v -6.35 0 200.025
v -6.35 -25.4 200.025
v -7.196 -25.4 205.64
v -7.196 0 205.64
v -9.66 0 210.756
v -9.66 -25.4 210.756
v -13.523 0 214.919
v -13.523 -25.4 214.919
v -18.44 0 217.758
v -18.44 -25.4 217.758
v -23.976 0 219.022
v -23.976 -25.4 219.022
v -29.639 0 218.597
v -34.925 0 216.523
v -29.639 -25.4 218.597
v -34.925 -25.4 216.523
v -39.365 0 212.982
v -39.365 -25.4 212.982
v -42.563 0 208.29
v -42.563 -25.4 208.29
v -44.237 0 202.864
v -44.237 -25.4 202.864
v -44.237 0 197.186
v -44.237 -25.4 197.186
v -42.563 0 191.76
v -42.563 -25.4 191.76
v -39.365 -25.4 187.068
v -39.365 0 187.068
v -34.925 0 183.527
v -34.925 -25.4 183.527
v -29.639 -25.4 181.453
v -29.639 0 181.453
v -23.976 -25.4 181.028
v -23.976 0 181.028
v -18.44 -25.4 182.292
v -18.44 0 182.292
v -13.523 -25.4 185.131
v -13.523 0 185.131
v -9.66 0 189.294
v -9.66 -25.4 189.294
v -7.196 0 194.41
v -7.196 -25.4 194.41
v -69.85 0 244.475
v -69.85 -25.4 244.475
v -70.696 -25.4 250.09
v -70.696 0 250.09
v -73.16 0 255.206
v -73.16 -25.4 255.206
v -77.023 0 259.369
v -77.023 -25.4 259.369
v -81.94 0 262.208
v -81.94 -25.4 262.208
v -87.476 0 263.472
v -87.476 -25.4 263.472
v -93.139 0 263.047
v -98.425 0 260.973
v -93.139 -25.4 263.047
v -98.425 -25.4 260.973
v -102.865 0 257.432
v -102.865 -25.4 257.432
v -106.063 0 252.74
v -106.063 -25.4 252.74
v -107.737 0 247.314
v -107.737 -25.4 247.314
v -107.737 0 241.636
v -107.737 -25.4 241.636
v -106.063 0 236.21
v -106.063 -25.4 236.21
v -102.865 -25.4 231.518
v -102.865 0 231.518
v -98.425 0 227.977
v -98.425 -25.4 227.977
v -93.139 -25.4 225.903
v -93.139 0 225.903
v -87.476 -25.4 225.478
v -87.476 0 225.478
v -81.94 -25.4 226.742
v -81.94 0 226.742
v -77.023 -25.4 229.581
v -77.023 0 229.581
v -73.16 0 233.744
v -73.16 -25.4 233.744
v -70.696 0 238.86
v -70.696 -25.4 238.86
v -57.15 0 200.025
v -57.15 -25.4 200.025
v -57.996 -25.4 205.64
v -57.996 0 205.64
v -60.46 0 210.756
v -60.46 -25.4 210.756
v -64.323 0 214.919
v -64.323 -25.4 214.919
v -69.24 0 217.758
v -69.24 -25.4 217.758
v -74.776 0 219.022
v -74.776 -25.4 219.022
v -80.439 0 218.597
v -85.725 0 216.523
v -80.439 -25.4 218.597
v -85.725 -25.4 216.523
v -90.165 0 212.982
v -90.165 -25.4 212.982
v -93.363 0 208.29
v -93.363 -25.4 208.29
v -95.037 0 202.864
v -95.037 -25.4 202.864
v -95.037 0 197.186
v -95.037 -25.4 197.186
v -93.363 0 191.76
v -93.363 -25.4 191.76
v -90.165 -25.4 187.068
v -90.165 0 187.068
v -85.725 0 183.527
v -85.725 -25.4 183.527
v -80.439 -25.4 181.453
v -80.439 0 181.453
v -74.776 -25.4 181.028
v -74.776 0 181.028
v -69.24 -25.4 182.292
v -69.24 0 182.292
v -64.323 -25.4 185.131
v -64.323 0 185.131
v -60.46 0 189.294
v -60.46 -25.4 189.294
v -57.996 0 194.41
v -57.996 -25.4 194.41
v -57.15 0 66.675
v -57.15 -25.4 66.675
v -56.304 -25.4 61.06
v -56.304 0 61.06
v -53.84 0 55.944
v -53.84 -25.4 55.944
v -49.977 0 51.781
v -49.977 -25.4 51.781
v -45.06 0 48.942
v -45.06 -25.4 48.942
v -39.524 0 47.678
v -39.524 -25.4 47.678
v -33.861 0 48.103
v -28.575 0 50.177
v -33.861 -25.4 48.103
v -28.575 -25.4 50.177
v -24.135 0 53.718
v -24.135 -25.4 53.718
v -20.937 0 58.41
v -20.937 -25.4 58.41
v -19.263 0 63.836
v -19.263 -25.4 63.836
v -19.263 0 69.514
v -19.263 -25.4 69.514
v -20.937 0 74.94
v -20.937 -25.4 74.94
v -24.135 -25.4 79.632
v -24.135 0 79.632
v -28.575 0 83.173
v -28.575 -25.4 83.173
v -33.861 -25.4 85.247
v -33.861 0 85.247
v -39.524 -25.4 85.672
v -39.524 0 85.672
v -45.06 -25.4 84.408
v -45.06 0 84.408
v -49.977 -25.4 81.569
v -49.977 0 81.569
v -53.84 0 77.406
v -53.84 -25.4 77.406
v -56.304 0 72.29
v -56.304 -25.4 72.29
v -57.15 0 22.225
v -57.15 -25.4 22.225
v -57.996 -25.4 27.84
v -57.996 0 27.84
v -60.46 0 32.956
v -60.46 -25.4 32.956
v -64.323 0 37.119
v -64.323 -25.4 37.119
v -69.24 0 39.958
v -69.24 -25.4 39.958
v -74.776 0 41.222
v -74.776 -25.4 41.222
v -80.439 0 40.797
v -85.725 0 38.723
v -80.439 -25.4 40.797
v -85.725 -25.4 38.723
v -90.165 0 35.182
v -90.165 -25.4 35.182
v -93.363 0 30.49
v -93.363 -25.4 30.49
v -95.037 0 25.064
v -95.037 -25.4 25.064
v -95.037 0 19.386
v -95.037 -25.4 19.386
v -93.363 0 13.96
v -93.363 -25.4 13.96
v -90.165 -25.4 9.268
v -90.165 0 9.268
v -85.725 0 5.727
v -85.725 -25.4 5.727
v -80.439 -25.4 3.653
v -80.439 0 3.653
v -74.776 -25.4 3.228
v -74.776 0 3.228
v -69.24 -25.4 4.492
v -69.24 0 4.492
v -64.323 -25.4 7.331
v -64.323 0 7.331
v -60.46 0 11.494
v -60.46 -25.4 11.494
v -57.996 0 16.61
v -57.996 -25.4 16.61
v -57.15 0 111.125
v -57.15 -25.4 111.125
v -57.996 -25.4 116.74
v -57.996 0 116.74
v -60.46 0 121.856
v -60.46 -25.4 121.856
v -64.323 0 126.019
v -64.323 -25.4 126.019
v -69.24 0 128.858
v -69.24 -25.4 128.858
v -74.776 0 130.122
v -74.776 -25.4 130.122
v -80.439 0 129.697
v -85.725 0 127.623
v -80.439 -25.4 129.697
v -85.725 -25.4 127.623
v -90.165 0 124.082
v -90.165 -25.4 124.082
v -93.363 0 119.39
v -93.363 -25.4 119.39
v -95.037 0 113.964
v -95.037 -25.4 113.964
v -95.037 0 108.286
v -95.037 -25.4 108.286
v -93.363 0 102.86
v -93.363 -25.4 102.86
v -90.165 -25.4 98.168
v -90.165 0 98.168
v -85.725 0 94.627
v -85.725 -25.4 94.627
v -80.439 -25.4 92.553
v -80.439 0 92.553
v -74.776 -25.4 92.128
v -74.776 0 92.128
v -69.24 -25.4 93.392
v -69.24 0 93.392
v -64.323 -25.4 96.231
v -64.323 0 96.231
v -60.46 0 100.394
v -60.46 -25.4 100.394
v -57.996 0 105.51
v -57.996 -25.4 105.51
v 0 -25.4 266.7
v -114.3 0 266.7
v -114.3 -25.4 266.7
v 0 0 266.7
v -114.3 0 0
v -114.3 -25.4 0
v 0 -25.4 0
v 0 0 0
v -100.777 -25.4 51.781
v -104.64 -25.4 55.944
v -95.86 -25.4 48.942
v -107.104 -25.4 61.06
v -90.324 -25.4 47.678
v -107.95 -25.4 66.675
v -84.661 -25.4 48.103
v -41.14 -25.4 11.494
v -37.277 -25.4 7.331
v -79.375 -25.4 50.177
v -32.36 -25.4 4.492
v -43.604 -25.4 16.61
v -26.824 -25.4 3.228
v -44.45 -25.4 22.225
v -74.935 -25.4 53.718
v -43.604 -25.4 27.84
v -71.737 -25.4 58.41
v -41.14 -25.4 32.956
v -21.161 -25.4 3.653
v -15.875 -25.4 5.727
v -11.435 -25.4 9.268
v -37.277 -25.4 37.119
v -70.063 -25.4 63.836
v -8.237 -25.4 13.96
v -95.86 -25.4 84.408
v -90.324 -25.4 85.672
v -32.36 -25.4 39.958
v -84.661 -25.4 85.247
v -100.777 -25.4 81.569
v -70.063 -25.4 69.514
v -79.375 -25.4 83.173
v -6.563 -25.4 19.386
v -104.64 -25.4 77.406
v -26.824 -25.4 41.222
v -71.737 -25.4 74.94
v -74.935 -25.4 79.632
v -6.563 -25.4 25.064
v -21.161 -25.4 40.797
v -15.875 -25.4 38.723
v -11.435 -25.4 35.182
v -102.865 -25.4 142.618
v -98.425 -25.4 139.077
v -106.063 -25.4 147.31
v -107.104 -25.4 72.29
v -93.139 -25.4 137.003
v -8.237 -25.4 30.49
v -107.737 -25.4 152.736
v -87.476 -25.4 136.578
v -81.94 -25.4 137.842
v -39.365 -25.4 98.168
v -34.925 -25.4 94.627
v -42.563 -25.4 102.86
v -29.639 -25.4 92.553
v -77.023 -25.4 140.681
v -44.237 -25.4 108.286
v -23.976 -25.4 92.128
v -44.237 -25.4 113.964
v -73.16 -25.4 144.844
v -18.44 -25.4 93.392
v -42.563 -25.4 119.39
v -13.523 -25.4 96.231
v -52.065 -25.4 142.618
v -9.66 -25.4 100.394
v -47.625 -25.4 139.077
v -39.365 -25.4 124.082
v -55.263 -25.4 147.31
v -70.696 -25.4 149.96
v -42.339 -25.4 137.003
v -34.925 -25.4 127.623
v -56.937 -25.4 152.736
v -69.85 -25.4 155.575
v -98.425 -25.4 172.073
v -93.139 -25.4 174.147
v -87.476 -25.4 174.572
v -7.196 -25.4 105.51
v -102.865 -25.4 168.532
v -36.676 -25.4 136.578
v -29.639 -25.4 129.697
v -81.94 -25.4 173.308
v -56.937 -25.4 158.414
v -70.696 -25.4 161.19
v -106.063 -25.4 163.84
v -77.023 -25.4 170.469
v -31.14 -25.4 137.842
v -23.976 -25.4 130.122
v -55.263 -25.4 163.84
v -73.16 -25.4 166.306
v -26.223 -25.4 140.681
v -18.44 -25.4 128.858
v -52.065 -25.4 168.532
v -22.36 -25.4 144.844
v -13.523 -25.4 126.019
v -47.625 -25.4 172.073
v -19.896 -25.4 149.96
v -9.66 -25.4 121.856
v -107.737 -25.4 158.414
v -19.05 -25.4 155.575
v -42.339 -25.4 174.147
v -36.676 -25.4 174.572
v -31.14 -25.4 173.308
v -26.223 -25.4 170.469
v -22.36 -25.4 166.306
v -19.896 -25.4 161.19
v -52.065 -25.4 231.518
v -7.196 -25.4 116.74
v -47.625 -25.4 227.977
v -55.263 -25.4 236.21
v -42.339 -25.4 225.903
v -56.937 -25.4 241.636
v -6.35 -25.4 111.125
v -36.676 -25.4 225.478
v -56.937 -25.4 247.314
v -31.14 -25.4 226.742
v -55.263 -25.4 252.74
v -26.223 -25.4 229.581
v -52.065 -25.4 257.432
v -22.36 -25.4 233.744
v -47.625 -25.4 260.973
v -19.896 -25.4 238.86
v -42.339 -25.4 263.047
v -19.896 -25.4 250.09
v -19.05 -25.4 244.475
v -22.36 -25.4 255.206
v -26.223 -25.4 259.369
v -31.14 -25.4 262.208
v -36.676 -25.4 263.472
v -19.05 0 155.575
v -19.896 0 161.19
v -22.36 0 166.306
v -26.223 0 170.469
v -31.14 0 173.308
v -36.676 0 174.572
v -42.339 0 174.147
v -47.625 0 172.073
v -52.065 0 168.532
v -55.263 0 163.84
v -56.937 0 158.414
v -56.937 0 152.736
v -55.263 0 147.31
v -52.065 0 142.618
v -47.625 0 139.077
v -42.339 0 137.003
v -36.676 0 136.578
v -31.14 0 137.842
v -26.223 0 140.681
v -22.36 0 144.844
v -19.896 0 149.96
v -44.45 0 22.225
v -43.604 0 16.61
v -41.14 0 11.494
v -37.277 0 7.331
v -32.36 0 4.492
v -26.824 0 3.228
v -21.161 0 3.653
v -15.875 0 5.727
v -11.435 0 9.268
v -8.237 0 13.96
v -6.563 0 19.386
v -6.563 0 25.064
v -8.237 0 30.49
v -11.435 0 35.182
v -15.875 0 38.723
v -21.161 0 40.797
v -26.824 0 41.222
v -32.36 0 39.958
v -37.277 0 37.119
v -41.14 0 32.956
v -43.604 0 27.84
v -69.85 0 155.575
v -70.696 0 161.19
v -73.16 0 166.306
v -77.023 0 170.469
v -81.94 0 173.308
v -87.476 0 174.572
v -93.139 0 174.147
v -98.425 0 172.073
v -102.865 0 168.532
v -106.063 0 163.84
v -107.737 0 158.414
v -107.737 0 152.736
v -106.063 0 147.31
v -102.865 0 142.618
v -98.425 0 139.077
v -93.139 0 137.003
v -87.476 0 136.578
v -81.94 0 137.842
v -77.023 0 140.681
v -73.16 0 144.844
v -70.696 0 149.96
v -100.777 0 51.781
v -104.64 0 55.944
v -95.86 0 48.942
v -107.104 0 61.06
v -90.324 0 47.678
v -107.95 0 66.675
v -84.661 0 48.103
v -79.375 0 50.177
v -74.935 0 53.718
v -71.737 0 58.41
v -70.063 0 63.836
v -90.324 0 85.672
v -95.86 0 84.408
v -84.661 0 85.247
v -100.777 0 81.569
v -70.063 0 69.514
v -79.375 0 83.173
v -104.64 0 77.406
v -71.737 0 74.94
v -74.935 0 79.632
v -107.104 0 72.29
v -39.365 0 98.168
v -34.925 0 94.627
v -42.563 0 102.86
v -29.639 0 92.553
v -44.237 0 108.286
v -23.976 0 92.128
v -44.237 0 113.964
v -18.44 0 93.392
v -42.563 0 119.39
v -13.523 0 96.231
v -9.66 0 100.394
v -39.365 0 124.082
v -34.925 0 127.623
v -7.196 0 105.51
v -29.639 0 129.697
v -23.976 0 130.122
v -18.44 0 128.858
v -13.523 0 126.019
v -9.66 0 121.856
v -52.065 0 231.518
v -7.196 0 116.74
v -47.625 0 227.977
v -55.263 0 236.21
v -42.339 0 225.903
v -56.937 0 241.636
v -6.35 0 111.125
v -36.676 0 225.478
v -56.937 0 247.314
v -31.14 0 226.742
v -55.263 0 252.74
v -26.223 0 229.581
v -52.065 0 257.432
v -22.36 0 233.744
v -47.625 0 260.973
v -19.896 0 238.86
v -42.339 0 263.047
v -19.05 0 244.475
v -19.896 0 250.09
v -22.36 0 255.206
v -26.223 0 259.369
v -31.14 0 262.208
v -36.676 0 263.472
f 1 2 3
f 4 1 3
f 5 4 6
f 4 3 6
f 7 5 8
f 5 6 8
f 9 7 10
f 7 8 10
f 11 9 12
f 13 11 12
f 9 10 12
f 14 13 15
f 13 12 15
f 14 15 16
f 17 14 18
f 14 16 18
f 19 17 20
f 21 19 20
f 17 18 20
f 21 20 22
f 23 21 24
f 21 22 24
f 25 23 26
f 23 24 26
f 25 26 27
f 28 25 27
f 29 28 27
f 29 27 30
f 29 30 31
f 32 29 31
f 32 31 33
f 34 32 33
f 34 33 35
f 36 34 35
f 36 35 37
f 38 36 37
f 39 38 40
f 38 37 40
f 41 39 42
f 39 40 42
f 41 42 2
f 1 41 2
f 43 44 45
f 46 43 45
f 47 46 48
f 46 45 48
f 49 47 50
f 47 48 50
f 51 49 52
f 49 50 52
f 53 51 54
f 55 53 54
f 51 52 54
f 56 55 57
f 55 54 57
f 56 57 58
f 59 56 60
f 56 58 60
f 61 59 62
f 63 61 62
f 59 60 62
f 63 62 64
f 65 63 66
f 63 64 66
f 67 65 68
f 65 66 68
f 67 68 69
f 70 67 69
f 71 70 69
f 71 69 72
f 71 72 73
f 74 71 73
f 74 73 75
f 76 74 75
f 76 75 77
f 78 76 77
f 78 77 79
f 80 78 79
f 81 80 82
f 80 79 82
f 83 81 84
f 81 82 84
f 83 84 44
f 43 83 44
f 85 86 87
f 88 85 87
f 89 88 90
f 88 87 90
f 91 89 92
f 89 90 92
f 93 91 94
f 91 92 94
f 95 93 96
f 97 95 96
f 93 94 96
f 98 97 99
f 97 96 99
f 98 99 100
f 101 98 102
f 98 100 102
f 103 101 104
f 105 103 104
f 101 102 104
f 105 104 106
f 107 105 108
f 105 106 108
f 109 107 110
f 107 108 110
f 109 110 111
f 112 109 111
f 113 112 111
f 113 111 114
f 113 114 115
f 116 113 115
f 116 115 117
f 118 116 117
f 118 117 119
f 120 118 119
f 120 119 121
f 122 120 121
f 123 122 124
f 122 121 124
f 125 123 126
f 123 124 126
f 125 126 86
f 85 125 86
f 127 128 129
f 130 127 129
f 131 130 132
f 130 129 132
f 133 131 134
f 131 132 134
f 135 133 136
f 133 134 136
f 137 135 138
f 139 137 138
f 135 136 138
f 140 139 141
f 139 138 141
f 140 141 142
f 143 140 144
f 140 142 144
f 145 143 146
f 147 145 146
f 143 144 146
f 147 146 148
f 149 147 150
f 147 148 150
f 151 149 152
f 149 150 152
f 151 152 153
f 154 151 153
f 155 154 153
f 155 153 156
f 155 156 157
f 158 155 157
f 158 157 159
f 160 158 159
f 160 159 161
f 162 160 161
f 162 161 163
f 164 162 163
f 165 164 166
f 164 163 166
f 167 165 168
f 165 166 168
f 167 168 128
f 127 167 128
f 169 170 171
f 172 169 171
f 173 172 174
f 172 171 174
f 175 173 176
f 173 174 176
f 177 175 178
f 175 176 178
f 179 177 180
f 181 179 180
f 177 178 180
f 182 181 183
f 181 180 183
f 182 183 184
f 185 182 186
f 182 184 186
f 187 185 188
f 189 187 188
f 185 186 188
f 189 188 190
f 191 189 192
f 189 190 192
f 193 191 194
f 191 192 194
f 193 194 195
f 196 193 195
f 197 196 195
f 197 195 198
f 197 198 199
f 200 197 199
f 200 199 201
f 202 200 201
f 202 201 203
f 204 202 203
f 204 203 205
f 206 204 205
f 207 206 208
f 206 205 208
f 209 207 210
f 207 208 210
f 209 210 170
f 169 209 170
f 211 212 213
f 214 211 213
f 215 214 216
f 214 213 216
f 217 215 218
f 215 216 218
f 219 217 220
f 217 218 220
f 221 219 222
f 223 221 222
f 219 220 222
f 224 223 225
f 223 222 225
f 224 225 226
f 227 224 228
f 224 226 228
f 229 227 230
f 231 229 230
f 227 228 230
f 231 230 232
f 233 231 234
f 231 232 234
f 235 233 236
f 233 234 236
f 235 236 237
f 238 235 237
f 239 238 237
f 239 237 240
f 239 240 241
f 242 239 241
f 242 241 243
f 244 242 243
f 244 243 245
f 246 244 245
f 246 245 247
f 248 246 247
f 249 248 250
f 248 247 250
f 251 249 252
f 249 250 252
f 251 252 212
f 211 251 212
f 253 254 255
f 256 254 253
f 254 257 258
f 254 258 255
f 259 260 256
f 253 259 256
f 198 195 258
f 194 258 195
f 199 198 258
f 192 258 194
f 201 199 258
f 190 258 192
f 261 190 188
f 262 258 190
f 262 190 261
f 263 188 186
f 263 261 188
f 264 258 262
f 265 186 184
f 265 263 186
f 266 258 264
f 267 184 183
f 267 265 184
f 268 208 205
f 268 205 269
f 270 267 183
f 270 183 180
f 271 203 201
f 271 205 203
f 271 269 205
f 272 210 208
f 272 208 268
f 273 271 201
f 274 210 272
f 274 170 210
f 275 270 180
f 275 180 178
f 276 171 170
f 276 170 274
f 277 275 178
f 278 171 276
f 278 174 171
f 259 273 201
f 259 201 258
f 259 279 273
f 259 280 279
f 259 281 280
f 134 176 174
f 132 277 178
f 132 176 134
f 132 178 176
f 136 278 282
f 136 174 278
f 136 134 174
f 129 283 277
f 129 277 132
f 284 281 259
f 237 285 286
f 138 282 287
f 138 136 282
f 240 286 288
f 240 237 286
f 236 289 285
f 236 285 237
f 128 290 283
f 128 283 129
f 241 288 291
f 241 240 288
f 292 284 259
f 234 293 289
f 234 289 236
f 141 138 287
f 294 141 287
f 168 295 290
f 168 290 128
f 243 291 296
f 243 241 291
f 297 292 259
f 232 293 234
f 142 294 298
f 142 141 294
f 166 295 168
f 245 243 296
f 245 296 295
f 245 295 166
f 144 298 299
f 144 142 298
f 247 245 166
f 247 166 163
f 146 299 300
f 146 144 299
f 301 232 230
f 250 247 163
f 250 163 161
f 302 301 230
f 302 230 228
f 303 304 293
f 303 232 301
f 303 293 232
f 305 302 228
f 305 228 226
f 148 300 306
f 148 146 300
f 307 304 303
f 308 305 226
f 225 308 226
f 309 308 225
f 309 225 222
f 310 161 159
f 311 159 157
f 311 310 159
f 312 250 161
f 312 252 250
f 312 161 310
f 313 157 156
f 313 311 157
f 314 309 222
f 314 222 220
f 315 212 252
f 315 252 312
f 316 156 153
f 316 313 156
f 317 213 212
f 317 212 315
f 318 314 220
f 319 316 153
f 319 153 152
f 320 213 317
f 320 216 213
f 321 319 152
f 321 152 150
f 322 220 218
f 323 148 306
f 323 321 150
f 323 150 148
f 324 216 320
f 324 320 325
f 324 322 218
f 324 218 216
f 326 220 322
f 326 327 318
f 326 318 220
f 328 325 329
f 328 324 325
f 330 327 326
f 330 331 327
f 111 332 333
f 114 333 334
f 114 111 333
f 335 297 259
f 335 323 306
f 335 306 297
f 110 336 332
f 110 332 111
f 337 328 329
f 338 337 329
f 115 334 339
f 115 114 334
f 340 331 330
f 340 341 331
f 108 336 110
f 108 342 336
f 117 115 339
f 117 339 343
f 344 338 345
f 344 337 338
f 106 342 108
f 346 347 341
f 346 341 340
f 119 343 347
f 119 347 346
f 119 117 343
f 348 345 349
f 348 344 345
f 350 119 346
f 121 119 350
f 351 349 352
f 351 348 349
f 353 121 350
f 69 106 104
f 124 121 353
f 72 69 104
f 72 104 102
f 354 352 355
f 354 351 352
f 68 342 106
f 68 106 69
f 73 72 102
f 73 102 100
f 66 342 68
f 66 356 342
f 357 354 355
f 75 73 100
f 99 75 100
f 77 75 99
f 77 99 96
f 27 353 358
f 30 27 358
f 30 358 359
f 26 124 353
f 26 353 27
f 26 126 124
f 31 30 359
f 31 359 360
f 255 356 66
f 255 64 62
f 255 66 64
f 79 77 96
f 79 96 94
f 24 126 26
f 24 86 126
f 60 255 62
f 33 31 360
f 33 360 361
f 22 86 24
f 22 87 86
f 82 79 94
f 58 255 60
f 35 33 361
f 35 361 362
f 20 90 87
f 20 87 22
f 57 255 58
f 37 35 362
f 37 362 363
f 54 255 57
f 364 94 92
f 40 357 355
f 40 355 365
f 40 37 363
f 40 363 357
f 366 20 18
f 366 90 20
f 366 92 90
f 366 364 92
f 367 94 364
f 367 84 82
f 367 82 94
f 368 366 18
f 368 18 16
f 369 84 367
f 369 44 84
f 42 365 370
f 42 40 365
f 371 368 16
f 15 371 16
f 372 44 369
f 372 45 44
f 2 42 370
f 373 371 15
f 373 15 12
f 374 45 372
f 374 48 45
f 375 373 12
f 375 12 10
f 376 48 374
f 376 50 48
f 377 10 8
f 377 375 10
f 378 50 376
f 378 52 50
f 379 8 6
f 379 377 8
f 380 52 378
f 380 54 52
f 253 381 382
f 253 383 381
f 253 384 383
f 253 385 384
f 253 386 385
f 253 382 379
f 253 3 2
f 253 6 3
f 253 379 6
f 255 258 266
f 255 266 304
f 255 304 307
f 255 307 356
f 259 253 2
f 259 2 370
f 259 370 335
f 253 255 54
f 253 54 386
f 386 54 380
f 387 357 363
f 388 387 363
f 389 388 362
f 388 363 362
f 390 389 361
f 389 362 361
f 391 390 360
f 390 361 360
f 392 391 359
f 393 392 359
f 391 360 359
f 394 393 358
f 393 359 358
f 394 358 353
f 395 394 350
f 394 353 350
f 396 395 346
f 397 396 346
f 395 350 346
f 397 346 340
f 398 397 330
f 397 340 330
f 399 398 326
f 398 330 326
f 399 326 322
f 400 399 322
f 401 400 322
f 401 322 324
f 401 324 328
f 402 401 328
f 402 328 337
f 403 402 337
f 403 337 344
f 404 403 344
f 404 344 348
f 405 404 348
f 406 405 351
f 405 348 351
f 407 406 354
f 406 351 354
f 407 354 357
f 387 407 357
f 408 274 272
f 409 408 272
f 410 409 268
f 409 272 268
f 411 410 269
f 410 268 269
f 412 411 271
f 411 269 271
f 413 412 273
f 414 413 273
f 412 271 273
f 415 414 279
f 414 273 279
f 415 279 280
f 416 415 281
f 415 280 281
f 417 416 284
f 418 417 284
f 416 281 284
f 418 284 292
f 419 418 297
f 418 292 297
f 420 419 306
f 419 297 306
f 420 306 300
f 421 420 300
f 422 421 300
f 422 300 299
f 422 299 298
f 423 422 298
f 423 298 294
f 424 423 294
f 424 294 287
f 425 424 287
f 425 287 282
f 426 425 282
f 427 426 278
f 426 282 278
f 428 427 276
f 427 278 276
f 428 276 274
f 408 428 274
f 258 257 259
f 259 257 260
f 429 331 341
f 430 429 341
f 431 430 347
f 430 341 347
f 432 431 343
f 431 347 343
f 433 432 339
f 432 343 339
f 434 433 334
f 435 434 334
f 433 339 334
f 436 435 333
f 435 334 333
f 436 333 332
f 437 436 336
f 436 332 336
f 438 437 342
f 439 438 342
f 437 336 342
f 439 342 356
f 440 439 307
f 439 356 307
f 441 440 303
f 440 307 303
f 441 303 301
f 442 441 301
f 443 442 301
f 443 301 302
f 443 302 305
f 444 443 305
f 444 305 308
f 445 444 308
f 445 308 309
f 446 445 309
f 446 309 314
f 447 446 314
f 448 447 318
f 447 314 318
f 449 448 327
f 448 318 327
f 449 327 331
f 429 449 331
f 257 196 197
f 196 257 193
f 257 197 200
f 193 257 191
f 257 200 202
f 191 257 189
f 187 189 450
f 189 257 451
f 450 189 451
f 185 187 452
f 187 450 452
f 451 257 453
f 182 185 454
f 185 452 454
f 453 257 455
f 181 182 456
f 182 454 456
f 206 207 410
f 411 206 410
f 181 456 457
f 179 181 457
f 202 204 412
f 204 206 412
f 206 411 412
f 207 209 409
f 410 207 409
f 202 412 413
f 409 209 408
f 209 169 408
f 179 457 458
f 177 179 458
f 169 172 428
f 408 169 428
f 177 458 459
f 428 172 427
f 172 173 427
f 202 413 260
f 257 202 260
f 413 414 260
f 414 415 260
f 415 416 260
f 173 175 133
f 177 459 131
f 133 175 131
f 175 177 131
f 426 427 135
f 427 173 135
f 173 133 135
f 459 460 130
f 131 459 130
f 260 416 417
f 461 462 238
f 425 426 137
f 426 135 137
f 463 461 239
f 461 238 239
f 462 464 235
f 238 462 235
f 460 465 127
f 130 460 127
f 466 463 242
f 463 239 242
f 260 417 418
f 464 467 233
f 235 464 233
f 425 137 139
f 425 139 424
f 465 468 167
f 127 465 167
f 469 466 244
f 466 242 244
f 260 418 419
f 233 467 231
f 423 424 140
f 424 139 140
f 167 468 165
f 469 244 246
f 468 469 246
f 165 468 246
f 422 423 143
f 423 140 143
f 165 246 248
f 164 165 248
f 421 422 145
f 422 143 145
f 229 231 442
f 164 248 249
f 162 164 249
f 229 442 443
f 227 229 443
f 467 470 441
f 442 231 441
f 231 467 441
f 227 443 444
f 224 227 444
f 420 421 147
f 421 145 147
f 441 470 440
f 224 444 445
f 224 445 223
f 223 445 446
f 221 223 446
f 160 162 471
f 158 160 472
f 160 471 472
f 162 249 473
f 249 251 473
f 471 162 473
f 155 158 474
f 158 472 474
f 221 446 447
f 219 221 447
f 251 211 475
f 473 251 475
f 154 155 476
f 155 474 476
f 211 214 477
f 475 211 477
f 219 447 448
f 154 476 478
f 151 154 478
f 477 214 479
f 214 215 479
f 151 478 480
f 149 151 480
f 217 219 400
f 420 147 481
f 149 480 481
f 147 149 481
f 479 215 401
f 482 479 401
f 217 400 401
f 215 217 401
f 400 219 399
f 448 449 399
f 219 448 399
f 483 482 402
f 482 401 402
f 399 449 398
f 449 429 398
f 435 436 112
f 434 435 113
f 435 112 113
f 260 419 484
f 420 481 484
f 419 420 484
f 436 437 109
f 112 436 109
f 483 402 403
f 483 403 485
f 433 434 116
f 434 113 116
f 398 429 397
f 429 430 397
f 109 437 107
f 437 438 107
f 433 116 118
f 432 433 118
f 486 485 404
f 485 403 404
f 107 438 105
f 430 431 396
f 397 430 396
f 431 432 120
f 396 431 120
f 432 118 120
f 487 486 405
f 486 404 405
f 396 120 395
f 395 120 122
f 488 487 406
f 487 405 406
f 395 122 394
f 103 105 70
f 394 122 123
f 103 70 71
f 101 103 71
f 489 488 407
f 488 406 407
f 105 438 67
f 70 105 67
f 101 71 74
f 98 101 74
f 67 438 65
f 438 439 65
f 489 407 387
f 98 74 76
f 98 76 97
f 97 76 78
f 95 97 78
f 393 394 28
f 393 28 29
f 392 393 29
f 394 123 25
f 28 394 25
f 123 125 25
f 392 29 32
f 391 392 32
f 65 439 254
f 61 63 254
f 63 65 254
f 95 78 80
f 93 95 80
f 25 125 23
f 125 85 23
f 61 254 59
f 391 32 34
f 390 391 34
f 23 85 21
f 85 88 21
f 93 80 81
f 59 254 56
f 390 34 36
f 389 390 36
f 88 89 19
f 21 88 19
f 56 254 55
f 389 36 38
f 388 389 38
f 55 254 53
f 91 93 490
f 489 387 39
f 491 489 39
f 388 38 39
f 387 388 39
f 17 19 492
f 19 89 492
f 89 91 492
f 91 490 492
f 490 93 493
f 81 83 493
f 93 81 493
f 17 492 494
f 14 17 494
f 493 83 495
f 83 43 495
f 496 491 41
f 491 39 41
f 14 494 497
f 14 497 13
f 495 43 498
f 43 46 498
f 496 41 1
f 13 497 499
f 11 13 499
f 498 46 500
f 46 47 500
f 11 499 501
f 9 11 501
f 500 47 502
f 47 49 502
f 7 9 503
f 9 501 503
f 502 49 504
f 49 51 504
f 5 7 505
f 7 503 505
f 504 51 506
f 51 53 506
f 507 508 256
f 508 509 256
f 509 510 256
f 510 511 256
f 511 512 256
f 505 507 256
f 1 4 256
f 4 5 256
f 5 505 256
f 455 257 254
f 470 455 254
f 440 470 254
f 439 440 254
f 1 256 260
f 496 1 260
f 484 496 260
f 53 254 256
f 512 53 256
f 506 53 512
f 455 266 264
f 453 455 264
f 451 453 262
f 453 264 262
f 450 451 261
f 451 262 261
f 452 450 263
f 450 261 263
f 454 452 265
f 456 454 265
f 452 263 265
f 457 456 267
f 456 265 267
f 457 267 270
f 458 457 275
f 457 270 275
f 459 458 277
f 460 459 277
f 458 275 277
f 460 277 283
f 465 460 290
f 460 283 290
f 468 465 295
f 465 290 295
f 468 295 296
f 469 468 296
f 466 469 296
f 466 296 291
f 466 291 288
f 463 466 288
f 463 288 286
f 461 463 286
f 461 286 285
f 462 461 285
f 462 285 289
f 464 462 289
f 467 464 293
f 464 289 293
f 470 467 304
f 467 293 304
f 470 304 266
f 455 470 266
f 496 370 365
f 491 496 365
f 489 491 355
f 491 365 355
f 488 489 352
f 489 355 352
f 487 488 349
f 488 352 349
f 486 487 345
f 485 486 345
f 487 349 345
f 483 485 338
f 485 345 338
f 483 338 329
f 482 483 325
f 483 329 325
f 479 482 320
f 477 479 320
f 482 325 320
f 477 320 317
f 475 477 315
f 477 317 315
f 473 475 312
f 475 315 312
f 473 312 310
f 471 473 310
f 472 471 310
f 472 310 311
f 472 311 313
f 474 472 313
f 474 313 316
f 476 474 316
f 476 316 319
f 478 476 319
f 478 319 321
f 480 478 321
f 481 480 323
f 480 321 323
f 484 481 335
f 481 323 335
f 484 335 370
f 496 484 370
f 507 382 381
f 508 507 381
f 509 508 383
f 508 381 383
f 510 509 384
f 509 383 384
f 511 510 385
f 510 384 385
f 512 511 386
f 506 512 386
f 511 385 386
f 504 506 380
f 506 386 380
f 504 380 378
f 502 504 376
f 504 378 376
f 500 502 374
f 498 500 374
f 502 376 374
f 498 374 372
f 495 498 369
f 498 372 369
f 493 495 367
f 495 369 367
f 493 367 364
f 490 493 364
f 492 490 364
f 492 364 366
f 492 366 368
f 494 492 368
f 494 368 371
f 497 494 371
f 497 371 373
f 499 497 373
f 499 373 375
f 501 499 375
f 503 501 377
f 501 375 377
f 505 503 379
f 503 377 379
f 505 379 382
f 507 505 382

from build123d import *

# Parameters (mm, degrees)
F0_W     = 114.3
F0_H     = 266.7
F1_DEPTH = 25.4
F2_R     = 19.05
F3_DEPTH = 25.4


with BuildPart() as f1:
    # F0 (on Front) → F1 (new body)
    with BuildSketch(Plane.XZ):
        with Locations((-57.15, 133.35)):
            Rectangle(F0_W, F0_H)
    extrude(amount=F1_DEPTH)

    # F2 (on face) → F3 (cut)
    with BuildSketch(Plane.XZ.offset(25.4)):
        with BuildLine():
            Line((-25.4, 22.225), (-6.35, 22.225))
            ThreePointArc((-6.35, 22.225), (-25.4, 41.275), (-44.45, 22.225))
            Line((-44.45, 22.225), (-25.4, 22.225))
        make_face()
        with Locations((-76.2, 22.225)):
            Circle(F2_R)
        with BuildLine():
            ThreePointArc((-44.45, 22.225), (-25.4, 3.175), (-6.35, 22.225))
            Line((-6.35, 22.225), (-25.4, 22.225))
            Line((-25.4, 22.225), (-44.45, 22.225))
        make_face()
        with BuildLine():
            ThreePointArc((-69.85, 66.675), (-88.9, 85.725), (-107.95, 66.675))
            Line((-107.95, 66.675), (-88.9, 66.675))
            Line((-88.9, 66.675), (-69.85, 66.675))
        make_face()
        with BuildLine():
            ThreePointArc((-19.05, 66.675), (-38.1, 85.725), (-57.15, 66.675))
            ThreePointArc((-57.15, 66.675), (-38.1, 47.625), (-19.05, 66.675))
        make_face()
        with BuildLine():
            Line((-88.9, 66.675), (-107.95, 66.675))
            ThreePointArc((-107.95, 66.675), (-88.9, 47.625), (-69.85, 66.675))
            Line((-69.85, 66.675), (-88.9, 66.675))
        make_face()
        with Locations((-25.4, 111.125)):
            Circle(F2_R)
        with Locations((-76.2, 111.125)):
            Circle(F2_R)
        with Locations((-25.4, 200.025)):
            Circle(F2_R)
        with Locations((-76.2, 200.025)):
            Circle(F2_R)
        with Locations((-38.1, 155.575)):
            Circle(F2_R)
        with Locations((-88.9, 155.575)):
            Circle(F2_R)
        with Locations((-38.1, 244.475)):
            Circle(F2_R)
        with Locations((-88.9, 244.475)):
            Circle(F2_R)
    extrude(amount=-F3_DEPTH, mode=Mode.SUBTRACT)


solid = f1.part
